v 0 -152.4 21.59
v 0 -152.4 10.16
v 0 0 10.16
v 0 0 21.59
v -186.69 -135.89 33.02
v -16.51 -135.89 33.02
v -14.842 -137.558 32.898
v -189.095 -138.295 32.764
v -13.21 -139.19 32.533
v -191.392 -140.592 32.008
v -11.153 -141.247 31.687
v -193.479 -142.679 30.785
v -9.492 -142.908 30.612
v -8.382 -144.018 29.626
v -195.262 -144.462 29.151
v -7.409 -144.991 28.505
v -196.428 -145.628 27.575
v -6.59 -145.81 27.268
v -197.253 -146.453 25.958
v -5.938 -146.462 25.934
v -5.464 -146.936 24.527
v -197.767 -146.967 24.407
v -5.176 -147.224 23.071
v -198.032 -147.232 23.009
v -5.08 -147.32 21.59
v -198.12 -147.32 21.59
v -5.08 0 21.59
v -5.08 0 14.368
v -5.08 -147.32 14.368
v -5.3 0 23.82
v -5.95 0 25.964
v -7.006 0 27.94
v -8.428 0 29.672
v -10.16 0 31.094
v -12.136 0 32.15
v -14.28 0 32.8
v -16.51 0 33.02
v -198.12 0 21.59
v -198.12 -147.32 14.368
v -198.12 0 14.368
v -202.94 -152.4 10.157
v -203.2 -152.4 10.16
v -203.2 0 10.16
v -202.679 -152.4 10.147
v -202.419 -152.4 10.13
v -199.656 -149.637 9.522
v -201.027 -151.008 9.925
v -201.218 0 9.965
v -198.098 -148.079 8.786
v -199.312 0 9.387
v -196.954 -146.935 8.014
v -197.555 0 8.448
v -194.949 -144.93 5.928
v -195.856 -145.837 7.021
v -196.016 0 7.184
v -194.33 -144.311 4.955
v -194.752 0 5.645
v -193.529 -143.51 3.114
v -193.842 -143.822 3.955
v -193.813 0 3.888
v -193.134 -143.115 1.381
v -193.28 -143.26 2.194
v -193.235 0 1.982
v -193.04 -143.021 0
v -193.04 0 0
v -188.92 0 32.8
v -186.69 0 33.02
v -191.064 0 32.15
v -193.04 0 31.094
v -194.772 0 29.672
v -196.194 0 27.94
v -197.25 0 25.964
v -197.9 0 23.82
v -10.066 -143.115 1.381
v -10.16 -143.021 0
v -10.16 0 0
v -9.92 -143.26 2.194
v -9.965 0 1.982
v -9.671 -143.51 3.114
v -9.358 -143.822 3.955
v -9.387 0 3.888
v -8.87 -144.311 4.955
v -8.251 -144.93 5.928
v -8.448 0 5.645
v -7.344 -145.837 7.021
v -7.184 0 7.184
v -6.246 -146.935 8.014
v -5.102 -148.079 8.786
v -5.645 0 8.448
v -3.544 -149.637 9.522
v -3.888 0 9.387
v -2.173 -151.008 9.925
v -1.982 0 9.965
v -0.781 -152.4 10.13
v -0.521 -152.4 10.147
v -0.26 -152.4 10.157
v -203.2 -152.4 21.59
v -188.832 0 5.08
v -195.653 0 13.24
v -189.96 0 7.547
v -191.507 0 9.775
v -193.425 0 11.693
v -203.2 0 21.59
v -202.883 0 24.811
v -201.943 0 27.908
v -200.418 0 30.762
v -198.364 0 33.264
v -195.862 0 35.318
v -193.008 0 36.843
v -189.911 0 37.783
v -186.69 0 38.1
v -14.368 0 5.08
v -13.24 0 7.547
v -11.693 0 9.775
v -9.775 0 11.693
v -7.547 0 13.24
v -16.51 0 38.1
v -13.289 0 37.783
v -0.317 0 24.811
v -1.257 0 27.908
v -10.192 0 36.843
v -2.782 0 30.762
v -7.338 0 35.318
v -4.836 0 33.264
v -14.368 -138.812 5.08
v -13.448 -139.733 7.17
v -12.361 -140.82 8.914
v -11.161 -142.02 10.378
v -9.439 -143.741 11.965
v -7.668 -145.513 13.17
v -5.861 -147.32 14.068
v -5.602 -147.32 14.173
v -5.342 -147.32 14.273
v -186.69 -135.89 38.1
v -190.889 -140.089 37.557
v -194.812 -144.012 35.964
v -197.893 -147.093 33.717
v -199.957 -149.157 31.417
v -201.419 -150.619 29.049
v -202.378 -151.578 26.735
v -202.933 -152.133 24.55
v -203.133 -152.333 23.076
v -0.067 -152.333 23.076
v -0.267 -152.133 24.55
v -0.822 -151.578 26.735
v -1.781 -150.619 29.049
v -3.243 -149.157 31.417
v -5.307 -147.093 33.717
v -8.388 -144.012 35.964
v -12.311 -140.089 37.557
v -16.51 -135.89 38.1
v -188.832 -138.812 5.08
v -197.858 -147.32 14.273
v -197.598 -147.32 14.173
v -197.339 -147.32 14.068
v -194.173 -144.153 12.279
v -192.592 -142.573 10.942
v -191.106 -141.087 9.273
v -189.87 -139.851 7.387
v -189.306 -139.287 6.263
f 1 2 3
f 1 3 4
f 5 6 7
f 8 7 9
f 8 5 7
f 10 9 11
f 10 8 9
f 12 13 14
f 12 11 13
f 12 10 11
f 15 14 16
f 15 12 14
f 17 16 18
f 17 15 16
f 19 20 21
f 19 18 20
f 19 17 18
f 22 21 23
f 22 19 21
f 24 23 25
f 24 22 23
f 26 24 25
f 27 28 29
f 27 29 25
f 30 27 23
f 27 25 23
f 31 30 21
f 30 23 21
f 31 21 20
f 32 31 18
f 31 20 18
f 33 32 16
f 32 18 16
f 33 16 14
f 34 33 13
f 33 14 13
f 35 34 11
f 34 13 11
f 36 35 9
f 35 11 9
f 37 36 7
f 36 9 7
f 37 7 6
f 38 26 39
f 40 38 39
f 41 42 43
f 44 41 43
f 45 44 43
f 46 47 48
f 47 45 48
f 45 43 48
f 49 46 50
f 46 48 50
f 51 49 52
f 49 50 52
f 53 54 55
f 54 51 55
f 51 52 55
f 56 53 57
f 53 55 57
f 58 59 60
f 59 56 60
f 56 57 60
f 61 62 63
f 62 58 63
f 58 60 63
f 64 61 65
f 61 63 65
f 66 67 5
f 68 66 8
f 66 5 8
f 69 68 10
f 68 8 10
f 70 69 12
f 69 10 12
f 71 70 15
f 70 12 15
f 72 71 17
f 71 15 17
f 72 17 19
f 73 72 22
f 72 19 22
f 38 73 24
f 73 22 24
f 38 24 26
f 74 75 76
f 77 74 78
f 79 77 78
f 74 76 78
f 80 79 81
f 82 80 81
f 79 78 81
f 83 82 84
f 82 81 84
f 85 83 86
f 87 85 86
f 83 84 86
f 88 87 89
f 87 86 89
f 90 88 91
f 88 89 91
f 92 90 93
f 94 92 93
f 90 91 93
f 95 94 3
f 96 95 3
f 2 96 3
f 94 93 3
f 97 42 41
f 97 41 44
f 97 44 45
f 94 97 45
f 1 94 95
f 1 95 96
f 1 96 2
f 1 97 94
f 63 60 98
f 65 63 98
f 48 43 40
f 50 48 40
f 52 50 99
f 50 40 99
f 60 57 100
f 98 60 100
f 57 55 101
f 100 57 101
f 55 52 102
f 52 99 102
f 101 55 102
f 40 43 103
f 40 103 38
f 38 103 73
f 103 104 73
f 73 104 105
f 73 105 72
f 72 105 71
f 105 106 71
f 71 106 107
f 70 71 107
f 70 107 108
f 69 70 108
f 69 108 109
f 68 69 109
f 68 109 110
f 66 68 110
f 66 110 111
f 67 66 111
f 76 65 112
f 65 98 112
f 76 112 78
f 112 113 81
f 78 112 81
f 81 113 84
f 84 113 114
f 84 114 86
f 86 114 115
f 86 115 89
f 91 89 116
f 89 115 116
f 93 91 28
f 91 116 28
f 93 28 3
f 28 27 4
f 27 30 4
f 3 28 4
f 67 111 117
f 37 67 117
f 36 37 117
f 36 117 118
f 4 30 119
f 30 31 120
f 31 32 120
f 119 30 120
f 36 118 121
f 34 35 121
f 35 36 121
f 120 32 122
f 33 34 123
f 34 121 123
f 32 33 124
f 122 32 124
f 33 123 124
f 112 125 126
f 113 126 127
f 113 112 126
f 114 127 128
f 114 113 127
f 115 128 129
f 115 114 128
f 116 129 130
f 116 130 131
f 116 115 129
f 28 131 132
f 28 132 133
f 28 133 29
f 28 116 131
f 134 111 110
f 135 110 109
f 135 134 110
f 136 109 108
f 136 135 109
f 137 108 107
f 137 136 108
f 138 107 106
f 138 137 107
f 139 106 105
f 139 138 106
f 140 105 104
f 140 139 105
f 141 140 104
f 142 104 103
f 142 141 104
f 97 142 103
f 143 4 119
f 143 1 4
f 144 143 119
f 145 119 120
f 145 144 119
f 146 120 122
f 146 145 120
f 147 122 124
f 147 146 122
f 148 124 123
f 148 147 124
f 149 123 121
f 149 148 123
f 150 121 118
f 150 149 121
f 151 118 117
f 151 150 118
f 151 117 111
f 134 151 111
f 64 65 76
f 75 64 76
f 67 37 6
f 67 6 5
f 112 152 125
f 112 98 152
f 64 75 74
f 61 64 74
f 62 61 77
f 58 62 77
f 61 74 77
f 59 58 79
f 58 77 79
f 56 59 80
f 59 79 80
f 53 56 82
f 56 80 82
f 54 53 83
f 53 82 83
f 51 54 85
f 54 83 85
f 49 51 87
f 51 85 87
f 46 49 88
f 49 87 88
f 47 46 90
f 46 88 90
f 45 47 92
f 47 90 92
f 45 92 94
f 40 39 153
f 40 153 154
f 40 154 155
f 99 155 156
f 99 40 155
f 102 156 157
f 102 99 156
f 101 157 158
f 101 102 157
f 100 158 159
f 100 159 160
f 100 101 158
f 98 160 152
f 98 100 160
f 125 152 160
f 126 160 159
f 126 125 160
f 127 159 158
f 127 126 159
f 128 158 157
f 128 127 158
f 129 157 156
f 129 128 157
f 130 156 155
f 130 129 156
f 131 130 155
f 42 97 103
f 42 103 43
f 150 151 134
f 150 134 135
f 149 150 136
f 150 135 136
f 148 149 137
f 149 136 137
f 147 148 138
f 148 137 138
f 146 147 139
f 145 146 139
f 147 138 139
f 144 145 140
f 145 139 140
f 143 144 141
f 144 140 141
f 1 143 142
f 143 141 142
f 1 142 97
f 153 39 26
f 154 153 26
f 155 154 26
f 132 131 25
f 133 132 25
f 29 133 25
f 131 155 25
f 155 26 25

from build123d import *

# Parameters (mm, degrees)
F5_DEPTH = 152.4
F1_R     = 10.16
F2_DEPTH = 254
F3_R     = 16.51
F6_T     = -5.08


with BuildPart() as f5:
    # F0 (on Front) → F5 (new body)
    with BuildSketch(Plane.XZ):
        with BuildLine():
            Line((-193.04, 0), (-10.16, 0))
            ThreePointArc((-10.16, 0), (-7.184205, 7.184205), (0, 10.16))
            Line((0, 10.16), (0, 38.1))
            Line((0, 38.1), (-203.2, 38.1))
            Line((-203.2, 38.1), (-203.2, 10.16))
            ThreePointArc((-203.2, 10.16), (-196.015795, 7.184205), (-193.04, 0))
        make_face()
    extrude(amount=F5_DEPTH)

    # F1 (on face) → F2 (cut)
    with BuildSketch(Plane.YZ):
        with Locations((-153.180798, 0)):
            Circle(F1_R)
    extrude(amount=-F2_DEPTH, mode=Mode.SUBTRACT)

    # F3
    f3_edges = [f5.edges().sort_by_distance(p)[0] for p in [
        (-101.6, -152.4, 38.1),
        (-203.2, -76.2, 38.1),
        (0, -76.2, 38.1),
    ]]
    fillet(f3_edges, radius=F3_R)

    # F6
    f6_openings = [f5.faces().sort_by_distance(p)[0] for p in [
        (-101.6, 0, 19.129387),
    ]]
    offset(amount=F6_T, openings=f6_openings)


solid = f5.part
